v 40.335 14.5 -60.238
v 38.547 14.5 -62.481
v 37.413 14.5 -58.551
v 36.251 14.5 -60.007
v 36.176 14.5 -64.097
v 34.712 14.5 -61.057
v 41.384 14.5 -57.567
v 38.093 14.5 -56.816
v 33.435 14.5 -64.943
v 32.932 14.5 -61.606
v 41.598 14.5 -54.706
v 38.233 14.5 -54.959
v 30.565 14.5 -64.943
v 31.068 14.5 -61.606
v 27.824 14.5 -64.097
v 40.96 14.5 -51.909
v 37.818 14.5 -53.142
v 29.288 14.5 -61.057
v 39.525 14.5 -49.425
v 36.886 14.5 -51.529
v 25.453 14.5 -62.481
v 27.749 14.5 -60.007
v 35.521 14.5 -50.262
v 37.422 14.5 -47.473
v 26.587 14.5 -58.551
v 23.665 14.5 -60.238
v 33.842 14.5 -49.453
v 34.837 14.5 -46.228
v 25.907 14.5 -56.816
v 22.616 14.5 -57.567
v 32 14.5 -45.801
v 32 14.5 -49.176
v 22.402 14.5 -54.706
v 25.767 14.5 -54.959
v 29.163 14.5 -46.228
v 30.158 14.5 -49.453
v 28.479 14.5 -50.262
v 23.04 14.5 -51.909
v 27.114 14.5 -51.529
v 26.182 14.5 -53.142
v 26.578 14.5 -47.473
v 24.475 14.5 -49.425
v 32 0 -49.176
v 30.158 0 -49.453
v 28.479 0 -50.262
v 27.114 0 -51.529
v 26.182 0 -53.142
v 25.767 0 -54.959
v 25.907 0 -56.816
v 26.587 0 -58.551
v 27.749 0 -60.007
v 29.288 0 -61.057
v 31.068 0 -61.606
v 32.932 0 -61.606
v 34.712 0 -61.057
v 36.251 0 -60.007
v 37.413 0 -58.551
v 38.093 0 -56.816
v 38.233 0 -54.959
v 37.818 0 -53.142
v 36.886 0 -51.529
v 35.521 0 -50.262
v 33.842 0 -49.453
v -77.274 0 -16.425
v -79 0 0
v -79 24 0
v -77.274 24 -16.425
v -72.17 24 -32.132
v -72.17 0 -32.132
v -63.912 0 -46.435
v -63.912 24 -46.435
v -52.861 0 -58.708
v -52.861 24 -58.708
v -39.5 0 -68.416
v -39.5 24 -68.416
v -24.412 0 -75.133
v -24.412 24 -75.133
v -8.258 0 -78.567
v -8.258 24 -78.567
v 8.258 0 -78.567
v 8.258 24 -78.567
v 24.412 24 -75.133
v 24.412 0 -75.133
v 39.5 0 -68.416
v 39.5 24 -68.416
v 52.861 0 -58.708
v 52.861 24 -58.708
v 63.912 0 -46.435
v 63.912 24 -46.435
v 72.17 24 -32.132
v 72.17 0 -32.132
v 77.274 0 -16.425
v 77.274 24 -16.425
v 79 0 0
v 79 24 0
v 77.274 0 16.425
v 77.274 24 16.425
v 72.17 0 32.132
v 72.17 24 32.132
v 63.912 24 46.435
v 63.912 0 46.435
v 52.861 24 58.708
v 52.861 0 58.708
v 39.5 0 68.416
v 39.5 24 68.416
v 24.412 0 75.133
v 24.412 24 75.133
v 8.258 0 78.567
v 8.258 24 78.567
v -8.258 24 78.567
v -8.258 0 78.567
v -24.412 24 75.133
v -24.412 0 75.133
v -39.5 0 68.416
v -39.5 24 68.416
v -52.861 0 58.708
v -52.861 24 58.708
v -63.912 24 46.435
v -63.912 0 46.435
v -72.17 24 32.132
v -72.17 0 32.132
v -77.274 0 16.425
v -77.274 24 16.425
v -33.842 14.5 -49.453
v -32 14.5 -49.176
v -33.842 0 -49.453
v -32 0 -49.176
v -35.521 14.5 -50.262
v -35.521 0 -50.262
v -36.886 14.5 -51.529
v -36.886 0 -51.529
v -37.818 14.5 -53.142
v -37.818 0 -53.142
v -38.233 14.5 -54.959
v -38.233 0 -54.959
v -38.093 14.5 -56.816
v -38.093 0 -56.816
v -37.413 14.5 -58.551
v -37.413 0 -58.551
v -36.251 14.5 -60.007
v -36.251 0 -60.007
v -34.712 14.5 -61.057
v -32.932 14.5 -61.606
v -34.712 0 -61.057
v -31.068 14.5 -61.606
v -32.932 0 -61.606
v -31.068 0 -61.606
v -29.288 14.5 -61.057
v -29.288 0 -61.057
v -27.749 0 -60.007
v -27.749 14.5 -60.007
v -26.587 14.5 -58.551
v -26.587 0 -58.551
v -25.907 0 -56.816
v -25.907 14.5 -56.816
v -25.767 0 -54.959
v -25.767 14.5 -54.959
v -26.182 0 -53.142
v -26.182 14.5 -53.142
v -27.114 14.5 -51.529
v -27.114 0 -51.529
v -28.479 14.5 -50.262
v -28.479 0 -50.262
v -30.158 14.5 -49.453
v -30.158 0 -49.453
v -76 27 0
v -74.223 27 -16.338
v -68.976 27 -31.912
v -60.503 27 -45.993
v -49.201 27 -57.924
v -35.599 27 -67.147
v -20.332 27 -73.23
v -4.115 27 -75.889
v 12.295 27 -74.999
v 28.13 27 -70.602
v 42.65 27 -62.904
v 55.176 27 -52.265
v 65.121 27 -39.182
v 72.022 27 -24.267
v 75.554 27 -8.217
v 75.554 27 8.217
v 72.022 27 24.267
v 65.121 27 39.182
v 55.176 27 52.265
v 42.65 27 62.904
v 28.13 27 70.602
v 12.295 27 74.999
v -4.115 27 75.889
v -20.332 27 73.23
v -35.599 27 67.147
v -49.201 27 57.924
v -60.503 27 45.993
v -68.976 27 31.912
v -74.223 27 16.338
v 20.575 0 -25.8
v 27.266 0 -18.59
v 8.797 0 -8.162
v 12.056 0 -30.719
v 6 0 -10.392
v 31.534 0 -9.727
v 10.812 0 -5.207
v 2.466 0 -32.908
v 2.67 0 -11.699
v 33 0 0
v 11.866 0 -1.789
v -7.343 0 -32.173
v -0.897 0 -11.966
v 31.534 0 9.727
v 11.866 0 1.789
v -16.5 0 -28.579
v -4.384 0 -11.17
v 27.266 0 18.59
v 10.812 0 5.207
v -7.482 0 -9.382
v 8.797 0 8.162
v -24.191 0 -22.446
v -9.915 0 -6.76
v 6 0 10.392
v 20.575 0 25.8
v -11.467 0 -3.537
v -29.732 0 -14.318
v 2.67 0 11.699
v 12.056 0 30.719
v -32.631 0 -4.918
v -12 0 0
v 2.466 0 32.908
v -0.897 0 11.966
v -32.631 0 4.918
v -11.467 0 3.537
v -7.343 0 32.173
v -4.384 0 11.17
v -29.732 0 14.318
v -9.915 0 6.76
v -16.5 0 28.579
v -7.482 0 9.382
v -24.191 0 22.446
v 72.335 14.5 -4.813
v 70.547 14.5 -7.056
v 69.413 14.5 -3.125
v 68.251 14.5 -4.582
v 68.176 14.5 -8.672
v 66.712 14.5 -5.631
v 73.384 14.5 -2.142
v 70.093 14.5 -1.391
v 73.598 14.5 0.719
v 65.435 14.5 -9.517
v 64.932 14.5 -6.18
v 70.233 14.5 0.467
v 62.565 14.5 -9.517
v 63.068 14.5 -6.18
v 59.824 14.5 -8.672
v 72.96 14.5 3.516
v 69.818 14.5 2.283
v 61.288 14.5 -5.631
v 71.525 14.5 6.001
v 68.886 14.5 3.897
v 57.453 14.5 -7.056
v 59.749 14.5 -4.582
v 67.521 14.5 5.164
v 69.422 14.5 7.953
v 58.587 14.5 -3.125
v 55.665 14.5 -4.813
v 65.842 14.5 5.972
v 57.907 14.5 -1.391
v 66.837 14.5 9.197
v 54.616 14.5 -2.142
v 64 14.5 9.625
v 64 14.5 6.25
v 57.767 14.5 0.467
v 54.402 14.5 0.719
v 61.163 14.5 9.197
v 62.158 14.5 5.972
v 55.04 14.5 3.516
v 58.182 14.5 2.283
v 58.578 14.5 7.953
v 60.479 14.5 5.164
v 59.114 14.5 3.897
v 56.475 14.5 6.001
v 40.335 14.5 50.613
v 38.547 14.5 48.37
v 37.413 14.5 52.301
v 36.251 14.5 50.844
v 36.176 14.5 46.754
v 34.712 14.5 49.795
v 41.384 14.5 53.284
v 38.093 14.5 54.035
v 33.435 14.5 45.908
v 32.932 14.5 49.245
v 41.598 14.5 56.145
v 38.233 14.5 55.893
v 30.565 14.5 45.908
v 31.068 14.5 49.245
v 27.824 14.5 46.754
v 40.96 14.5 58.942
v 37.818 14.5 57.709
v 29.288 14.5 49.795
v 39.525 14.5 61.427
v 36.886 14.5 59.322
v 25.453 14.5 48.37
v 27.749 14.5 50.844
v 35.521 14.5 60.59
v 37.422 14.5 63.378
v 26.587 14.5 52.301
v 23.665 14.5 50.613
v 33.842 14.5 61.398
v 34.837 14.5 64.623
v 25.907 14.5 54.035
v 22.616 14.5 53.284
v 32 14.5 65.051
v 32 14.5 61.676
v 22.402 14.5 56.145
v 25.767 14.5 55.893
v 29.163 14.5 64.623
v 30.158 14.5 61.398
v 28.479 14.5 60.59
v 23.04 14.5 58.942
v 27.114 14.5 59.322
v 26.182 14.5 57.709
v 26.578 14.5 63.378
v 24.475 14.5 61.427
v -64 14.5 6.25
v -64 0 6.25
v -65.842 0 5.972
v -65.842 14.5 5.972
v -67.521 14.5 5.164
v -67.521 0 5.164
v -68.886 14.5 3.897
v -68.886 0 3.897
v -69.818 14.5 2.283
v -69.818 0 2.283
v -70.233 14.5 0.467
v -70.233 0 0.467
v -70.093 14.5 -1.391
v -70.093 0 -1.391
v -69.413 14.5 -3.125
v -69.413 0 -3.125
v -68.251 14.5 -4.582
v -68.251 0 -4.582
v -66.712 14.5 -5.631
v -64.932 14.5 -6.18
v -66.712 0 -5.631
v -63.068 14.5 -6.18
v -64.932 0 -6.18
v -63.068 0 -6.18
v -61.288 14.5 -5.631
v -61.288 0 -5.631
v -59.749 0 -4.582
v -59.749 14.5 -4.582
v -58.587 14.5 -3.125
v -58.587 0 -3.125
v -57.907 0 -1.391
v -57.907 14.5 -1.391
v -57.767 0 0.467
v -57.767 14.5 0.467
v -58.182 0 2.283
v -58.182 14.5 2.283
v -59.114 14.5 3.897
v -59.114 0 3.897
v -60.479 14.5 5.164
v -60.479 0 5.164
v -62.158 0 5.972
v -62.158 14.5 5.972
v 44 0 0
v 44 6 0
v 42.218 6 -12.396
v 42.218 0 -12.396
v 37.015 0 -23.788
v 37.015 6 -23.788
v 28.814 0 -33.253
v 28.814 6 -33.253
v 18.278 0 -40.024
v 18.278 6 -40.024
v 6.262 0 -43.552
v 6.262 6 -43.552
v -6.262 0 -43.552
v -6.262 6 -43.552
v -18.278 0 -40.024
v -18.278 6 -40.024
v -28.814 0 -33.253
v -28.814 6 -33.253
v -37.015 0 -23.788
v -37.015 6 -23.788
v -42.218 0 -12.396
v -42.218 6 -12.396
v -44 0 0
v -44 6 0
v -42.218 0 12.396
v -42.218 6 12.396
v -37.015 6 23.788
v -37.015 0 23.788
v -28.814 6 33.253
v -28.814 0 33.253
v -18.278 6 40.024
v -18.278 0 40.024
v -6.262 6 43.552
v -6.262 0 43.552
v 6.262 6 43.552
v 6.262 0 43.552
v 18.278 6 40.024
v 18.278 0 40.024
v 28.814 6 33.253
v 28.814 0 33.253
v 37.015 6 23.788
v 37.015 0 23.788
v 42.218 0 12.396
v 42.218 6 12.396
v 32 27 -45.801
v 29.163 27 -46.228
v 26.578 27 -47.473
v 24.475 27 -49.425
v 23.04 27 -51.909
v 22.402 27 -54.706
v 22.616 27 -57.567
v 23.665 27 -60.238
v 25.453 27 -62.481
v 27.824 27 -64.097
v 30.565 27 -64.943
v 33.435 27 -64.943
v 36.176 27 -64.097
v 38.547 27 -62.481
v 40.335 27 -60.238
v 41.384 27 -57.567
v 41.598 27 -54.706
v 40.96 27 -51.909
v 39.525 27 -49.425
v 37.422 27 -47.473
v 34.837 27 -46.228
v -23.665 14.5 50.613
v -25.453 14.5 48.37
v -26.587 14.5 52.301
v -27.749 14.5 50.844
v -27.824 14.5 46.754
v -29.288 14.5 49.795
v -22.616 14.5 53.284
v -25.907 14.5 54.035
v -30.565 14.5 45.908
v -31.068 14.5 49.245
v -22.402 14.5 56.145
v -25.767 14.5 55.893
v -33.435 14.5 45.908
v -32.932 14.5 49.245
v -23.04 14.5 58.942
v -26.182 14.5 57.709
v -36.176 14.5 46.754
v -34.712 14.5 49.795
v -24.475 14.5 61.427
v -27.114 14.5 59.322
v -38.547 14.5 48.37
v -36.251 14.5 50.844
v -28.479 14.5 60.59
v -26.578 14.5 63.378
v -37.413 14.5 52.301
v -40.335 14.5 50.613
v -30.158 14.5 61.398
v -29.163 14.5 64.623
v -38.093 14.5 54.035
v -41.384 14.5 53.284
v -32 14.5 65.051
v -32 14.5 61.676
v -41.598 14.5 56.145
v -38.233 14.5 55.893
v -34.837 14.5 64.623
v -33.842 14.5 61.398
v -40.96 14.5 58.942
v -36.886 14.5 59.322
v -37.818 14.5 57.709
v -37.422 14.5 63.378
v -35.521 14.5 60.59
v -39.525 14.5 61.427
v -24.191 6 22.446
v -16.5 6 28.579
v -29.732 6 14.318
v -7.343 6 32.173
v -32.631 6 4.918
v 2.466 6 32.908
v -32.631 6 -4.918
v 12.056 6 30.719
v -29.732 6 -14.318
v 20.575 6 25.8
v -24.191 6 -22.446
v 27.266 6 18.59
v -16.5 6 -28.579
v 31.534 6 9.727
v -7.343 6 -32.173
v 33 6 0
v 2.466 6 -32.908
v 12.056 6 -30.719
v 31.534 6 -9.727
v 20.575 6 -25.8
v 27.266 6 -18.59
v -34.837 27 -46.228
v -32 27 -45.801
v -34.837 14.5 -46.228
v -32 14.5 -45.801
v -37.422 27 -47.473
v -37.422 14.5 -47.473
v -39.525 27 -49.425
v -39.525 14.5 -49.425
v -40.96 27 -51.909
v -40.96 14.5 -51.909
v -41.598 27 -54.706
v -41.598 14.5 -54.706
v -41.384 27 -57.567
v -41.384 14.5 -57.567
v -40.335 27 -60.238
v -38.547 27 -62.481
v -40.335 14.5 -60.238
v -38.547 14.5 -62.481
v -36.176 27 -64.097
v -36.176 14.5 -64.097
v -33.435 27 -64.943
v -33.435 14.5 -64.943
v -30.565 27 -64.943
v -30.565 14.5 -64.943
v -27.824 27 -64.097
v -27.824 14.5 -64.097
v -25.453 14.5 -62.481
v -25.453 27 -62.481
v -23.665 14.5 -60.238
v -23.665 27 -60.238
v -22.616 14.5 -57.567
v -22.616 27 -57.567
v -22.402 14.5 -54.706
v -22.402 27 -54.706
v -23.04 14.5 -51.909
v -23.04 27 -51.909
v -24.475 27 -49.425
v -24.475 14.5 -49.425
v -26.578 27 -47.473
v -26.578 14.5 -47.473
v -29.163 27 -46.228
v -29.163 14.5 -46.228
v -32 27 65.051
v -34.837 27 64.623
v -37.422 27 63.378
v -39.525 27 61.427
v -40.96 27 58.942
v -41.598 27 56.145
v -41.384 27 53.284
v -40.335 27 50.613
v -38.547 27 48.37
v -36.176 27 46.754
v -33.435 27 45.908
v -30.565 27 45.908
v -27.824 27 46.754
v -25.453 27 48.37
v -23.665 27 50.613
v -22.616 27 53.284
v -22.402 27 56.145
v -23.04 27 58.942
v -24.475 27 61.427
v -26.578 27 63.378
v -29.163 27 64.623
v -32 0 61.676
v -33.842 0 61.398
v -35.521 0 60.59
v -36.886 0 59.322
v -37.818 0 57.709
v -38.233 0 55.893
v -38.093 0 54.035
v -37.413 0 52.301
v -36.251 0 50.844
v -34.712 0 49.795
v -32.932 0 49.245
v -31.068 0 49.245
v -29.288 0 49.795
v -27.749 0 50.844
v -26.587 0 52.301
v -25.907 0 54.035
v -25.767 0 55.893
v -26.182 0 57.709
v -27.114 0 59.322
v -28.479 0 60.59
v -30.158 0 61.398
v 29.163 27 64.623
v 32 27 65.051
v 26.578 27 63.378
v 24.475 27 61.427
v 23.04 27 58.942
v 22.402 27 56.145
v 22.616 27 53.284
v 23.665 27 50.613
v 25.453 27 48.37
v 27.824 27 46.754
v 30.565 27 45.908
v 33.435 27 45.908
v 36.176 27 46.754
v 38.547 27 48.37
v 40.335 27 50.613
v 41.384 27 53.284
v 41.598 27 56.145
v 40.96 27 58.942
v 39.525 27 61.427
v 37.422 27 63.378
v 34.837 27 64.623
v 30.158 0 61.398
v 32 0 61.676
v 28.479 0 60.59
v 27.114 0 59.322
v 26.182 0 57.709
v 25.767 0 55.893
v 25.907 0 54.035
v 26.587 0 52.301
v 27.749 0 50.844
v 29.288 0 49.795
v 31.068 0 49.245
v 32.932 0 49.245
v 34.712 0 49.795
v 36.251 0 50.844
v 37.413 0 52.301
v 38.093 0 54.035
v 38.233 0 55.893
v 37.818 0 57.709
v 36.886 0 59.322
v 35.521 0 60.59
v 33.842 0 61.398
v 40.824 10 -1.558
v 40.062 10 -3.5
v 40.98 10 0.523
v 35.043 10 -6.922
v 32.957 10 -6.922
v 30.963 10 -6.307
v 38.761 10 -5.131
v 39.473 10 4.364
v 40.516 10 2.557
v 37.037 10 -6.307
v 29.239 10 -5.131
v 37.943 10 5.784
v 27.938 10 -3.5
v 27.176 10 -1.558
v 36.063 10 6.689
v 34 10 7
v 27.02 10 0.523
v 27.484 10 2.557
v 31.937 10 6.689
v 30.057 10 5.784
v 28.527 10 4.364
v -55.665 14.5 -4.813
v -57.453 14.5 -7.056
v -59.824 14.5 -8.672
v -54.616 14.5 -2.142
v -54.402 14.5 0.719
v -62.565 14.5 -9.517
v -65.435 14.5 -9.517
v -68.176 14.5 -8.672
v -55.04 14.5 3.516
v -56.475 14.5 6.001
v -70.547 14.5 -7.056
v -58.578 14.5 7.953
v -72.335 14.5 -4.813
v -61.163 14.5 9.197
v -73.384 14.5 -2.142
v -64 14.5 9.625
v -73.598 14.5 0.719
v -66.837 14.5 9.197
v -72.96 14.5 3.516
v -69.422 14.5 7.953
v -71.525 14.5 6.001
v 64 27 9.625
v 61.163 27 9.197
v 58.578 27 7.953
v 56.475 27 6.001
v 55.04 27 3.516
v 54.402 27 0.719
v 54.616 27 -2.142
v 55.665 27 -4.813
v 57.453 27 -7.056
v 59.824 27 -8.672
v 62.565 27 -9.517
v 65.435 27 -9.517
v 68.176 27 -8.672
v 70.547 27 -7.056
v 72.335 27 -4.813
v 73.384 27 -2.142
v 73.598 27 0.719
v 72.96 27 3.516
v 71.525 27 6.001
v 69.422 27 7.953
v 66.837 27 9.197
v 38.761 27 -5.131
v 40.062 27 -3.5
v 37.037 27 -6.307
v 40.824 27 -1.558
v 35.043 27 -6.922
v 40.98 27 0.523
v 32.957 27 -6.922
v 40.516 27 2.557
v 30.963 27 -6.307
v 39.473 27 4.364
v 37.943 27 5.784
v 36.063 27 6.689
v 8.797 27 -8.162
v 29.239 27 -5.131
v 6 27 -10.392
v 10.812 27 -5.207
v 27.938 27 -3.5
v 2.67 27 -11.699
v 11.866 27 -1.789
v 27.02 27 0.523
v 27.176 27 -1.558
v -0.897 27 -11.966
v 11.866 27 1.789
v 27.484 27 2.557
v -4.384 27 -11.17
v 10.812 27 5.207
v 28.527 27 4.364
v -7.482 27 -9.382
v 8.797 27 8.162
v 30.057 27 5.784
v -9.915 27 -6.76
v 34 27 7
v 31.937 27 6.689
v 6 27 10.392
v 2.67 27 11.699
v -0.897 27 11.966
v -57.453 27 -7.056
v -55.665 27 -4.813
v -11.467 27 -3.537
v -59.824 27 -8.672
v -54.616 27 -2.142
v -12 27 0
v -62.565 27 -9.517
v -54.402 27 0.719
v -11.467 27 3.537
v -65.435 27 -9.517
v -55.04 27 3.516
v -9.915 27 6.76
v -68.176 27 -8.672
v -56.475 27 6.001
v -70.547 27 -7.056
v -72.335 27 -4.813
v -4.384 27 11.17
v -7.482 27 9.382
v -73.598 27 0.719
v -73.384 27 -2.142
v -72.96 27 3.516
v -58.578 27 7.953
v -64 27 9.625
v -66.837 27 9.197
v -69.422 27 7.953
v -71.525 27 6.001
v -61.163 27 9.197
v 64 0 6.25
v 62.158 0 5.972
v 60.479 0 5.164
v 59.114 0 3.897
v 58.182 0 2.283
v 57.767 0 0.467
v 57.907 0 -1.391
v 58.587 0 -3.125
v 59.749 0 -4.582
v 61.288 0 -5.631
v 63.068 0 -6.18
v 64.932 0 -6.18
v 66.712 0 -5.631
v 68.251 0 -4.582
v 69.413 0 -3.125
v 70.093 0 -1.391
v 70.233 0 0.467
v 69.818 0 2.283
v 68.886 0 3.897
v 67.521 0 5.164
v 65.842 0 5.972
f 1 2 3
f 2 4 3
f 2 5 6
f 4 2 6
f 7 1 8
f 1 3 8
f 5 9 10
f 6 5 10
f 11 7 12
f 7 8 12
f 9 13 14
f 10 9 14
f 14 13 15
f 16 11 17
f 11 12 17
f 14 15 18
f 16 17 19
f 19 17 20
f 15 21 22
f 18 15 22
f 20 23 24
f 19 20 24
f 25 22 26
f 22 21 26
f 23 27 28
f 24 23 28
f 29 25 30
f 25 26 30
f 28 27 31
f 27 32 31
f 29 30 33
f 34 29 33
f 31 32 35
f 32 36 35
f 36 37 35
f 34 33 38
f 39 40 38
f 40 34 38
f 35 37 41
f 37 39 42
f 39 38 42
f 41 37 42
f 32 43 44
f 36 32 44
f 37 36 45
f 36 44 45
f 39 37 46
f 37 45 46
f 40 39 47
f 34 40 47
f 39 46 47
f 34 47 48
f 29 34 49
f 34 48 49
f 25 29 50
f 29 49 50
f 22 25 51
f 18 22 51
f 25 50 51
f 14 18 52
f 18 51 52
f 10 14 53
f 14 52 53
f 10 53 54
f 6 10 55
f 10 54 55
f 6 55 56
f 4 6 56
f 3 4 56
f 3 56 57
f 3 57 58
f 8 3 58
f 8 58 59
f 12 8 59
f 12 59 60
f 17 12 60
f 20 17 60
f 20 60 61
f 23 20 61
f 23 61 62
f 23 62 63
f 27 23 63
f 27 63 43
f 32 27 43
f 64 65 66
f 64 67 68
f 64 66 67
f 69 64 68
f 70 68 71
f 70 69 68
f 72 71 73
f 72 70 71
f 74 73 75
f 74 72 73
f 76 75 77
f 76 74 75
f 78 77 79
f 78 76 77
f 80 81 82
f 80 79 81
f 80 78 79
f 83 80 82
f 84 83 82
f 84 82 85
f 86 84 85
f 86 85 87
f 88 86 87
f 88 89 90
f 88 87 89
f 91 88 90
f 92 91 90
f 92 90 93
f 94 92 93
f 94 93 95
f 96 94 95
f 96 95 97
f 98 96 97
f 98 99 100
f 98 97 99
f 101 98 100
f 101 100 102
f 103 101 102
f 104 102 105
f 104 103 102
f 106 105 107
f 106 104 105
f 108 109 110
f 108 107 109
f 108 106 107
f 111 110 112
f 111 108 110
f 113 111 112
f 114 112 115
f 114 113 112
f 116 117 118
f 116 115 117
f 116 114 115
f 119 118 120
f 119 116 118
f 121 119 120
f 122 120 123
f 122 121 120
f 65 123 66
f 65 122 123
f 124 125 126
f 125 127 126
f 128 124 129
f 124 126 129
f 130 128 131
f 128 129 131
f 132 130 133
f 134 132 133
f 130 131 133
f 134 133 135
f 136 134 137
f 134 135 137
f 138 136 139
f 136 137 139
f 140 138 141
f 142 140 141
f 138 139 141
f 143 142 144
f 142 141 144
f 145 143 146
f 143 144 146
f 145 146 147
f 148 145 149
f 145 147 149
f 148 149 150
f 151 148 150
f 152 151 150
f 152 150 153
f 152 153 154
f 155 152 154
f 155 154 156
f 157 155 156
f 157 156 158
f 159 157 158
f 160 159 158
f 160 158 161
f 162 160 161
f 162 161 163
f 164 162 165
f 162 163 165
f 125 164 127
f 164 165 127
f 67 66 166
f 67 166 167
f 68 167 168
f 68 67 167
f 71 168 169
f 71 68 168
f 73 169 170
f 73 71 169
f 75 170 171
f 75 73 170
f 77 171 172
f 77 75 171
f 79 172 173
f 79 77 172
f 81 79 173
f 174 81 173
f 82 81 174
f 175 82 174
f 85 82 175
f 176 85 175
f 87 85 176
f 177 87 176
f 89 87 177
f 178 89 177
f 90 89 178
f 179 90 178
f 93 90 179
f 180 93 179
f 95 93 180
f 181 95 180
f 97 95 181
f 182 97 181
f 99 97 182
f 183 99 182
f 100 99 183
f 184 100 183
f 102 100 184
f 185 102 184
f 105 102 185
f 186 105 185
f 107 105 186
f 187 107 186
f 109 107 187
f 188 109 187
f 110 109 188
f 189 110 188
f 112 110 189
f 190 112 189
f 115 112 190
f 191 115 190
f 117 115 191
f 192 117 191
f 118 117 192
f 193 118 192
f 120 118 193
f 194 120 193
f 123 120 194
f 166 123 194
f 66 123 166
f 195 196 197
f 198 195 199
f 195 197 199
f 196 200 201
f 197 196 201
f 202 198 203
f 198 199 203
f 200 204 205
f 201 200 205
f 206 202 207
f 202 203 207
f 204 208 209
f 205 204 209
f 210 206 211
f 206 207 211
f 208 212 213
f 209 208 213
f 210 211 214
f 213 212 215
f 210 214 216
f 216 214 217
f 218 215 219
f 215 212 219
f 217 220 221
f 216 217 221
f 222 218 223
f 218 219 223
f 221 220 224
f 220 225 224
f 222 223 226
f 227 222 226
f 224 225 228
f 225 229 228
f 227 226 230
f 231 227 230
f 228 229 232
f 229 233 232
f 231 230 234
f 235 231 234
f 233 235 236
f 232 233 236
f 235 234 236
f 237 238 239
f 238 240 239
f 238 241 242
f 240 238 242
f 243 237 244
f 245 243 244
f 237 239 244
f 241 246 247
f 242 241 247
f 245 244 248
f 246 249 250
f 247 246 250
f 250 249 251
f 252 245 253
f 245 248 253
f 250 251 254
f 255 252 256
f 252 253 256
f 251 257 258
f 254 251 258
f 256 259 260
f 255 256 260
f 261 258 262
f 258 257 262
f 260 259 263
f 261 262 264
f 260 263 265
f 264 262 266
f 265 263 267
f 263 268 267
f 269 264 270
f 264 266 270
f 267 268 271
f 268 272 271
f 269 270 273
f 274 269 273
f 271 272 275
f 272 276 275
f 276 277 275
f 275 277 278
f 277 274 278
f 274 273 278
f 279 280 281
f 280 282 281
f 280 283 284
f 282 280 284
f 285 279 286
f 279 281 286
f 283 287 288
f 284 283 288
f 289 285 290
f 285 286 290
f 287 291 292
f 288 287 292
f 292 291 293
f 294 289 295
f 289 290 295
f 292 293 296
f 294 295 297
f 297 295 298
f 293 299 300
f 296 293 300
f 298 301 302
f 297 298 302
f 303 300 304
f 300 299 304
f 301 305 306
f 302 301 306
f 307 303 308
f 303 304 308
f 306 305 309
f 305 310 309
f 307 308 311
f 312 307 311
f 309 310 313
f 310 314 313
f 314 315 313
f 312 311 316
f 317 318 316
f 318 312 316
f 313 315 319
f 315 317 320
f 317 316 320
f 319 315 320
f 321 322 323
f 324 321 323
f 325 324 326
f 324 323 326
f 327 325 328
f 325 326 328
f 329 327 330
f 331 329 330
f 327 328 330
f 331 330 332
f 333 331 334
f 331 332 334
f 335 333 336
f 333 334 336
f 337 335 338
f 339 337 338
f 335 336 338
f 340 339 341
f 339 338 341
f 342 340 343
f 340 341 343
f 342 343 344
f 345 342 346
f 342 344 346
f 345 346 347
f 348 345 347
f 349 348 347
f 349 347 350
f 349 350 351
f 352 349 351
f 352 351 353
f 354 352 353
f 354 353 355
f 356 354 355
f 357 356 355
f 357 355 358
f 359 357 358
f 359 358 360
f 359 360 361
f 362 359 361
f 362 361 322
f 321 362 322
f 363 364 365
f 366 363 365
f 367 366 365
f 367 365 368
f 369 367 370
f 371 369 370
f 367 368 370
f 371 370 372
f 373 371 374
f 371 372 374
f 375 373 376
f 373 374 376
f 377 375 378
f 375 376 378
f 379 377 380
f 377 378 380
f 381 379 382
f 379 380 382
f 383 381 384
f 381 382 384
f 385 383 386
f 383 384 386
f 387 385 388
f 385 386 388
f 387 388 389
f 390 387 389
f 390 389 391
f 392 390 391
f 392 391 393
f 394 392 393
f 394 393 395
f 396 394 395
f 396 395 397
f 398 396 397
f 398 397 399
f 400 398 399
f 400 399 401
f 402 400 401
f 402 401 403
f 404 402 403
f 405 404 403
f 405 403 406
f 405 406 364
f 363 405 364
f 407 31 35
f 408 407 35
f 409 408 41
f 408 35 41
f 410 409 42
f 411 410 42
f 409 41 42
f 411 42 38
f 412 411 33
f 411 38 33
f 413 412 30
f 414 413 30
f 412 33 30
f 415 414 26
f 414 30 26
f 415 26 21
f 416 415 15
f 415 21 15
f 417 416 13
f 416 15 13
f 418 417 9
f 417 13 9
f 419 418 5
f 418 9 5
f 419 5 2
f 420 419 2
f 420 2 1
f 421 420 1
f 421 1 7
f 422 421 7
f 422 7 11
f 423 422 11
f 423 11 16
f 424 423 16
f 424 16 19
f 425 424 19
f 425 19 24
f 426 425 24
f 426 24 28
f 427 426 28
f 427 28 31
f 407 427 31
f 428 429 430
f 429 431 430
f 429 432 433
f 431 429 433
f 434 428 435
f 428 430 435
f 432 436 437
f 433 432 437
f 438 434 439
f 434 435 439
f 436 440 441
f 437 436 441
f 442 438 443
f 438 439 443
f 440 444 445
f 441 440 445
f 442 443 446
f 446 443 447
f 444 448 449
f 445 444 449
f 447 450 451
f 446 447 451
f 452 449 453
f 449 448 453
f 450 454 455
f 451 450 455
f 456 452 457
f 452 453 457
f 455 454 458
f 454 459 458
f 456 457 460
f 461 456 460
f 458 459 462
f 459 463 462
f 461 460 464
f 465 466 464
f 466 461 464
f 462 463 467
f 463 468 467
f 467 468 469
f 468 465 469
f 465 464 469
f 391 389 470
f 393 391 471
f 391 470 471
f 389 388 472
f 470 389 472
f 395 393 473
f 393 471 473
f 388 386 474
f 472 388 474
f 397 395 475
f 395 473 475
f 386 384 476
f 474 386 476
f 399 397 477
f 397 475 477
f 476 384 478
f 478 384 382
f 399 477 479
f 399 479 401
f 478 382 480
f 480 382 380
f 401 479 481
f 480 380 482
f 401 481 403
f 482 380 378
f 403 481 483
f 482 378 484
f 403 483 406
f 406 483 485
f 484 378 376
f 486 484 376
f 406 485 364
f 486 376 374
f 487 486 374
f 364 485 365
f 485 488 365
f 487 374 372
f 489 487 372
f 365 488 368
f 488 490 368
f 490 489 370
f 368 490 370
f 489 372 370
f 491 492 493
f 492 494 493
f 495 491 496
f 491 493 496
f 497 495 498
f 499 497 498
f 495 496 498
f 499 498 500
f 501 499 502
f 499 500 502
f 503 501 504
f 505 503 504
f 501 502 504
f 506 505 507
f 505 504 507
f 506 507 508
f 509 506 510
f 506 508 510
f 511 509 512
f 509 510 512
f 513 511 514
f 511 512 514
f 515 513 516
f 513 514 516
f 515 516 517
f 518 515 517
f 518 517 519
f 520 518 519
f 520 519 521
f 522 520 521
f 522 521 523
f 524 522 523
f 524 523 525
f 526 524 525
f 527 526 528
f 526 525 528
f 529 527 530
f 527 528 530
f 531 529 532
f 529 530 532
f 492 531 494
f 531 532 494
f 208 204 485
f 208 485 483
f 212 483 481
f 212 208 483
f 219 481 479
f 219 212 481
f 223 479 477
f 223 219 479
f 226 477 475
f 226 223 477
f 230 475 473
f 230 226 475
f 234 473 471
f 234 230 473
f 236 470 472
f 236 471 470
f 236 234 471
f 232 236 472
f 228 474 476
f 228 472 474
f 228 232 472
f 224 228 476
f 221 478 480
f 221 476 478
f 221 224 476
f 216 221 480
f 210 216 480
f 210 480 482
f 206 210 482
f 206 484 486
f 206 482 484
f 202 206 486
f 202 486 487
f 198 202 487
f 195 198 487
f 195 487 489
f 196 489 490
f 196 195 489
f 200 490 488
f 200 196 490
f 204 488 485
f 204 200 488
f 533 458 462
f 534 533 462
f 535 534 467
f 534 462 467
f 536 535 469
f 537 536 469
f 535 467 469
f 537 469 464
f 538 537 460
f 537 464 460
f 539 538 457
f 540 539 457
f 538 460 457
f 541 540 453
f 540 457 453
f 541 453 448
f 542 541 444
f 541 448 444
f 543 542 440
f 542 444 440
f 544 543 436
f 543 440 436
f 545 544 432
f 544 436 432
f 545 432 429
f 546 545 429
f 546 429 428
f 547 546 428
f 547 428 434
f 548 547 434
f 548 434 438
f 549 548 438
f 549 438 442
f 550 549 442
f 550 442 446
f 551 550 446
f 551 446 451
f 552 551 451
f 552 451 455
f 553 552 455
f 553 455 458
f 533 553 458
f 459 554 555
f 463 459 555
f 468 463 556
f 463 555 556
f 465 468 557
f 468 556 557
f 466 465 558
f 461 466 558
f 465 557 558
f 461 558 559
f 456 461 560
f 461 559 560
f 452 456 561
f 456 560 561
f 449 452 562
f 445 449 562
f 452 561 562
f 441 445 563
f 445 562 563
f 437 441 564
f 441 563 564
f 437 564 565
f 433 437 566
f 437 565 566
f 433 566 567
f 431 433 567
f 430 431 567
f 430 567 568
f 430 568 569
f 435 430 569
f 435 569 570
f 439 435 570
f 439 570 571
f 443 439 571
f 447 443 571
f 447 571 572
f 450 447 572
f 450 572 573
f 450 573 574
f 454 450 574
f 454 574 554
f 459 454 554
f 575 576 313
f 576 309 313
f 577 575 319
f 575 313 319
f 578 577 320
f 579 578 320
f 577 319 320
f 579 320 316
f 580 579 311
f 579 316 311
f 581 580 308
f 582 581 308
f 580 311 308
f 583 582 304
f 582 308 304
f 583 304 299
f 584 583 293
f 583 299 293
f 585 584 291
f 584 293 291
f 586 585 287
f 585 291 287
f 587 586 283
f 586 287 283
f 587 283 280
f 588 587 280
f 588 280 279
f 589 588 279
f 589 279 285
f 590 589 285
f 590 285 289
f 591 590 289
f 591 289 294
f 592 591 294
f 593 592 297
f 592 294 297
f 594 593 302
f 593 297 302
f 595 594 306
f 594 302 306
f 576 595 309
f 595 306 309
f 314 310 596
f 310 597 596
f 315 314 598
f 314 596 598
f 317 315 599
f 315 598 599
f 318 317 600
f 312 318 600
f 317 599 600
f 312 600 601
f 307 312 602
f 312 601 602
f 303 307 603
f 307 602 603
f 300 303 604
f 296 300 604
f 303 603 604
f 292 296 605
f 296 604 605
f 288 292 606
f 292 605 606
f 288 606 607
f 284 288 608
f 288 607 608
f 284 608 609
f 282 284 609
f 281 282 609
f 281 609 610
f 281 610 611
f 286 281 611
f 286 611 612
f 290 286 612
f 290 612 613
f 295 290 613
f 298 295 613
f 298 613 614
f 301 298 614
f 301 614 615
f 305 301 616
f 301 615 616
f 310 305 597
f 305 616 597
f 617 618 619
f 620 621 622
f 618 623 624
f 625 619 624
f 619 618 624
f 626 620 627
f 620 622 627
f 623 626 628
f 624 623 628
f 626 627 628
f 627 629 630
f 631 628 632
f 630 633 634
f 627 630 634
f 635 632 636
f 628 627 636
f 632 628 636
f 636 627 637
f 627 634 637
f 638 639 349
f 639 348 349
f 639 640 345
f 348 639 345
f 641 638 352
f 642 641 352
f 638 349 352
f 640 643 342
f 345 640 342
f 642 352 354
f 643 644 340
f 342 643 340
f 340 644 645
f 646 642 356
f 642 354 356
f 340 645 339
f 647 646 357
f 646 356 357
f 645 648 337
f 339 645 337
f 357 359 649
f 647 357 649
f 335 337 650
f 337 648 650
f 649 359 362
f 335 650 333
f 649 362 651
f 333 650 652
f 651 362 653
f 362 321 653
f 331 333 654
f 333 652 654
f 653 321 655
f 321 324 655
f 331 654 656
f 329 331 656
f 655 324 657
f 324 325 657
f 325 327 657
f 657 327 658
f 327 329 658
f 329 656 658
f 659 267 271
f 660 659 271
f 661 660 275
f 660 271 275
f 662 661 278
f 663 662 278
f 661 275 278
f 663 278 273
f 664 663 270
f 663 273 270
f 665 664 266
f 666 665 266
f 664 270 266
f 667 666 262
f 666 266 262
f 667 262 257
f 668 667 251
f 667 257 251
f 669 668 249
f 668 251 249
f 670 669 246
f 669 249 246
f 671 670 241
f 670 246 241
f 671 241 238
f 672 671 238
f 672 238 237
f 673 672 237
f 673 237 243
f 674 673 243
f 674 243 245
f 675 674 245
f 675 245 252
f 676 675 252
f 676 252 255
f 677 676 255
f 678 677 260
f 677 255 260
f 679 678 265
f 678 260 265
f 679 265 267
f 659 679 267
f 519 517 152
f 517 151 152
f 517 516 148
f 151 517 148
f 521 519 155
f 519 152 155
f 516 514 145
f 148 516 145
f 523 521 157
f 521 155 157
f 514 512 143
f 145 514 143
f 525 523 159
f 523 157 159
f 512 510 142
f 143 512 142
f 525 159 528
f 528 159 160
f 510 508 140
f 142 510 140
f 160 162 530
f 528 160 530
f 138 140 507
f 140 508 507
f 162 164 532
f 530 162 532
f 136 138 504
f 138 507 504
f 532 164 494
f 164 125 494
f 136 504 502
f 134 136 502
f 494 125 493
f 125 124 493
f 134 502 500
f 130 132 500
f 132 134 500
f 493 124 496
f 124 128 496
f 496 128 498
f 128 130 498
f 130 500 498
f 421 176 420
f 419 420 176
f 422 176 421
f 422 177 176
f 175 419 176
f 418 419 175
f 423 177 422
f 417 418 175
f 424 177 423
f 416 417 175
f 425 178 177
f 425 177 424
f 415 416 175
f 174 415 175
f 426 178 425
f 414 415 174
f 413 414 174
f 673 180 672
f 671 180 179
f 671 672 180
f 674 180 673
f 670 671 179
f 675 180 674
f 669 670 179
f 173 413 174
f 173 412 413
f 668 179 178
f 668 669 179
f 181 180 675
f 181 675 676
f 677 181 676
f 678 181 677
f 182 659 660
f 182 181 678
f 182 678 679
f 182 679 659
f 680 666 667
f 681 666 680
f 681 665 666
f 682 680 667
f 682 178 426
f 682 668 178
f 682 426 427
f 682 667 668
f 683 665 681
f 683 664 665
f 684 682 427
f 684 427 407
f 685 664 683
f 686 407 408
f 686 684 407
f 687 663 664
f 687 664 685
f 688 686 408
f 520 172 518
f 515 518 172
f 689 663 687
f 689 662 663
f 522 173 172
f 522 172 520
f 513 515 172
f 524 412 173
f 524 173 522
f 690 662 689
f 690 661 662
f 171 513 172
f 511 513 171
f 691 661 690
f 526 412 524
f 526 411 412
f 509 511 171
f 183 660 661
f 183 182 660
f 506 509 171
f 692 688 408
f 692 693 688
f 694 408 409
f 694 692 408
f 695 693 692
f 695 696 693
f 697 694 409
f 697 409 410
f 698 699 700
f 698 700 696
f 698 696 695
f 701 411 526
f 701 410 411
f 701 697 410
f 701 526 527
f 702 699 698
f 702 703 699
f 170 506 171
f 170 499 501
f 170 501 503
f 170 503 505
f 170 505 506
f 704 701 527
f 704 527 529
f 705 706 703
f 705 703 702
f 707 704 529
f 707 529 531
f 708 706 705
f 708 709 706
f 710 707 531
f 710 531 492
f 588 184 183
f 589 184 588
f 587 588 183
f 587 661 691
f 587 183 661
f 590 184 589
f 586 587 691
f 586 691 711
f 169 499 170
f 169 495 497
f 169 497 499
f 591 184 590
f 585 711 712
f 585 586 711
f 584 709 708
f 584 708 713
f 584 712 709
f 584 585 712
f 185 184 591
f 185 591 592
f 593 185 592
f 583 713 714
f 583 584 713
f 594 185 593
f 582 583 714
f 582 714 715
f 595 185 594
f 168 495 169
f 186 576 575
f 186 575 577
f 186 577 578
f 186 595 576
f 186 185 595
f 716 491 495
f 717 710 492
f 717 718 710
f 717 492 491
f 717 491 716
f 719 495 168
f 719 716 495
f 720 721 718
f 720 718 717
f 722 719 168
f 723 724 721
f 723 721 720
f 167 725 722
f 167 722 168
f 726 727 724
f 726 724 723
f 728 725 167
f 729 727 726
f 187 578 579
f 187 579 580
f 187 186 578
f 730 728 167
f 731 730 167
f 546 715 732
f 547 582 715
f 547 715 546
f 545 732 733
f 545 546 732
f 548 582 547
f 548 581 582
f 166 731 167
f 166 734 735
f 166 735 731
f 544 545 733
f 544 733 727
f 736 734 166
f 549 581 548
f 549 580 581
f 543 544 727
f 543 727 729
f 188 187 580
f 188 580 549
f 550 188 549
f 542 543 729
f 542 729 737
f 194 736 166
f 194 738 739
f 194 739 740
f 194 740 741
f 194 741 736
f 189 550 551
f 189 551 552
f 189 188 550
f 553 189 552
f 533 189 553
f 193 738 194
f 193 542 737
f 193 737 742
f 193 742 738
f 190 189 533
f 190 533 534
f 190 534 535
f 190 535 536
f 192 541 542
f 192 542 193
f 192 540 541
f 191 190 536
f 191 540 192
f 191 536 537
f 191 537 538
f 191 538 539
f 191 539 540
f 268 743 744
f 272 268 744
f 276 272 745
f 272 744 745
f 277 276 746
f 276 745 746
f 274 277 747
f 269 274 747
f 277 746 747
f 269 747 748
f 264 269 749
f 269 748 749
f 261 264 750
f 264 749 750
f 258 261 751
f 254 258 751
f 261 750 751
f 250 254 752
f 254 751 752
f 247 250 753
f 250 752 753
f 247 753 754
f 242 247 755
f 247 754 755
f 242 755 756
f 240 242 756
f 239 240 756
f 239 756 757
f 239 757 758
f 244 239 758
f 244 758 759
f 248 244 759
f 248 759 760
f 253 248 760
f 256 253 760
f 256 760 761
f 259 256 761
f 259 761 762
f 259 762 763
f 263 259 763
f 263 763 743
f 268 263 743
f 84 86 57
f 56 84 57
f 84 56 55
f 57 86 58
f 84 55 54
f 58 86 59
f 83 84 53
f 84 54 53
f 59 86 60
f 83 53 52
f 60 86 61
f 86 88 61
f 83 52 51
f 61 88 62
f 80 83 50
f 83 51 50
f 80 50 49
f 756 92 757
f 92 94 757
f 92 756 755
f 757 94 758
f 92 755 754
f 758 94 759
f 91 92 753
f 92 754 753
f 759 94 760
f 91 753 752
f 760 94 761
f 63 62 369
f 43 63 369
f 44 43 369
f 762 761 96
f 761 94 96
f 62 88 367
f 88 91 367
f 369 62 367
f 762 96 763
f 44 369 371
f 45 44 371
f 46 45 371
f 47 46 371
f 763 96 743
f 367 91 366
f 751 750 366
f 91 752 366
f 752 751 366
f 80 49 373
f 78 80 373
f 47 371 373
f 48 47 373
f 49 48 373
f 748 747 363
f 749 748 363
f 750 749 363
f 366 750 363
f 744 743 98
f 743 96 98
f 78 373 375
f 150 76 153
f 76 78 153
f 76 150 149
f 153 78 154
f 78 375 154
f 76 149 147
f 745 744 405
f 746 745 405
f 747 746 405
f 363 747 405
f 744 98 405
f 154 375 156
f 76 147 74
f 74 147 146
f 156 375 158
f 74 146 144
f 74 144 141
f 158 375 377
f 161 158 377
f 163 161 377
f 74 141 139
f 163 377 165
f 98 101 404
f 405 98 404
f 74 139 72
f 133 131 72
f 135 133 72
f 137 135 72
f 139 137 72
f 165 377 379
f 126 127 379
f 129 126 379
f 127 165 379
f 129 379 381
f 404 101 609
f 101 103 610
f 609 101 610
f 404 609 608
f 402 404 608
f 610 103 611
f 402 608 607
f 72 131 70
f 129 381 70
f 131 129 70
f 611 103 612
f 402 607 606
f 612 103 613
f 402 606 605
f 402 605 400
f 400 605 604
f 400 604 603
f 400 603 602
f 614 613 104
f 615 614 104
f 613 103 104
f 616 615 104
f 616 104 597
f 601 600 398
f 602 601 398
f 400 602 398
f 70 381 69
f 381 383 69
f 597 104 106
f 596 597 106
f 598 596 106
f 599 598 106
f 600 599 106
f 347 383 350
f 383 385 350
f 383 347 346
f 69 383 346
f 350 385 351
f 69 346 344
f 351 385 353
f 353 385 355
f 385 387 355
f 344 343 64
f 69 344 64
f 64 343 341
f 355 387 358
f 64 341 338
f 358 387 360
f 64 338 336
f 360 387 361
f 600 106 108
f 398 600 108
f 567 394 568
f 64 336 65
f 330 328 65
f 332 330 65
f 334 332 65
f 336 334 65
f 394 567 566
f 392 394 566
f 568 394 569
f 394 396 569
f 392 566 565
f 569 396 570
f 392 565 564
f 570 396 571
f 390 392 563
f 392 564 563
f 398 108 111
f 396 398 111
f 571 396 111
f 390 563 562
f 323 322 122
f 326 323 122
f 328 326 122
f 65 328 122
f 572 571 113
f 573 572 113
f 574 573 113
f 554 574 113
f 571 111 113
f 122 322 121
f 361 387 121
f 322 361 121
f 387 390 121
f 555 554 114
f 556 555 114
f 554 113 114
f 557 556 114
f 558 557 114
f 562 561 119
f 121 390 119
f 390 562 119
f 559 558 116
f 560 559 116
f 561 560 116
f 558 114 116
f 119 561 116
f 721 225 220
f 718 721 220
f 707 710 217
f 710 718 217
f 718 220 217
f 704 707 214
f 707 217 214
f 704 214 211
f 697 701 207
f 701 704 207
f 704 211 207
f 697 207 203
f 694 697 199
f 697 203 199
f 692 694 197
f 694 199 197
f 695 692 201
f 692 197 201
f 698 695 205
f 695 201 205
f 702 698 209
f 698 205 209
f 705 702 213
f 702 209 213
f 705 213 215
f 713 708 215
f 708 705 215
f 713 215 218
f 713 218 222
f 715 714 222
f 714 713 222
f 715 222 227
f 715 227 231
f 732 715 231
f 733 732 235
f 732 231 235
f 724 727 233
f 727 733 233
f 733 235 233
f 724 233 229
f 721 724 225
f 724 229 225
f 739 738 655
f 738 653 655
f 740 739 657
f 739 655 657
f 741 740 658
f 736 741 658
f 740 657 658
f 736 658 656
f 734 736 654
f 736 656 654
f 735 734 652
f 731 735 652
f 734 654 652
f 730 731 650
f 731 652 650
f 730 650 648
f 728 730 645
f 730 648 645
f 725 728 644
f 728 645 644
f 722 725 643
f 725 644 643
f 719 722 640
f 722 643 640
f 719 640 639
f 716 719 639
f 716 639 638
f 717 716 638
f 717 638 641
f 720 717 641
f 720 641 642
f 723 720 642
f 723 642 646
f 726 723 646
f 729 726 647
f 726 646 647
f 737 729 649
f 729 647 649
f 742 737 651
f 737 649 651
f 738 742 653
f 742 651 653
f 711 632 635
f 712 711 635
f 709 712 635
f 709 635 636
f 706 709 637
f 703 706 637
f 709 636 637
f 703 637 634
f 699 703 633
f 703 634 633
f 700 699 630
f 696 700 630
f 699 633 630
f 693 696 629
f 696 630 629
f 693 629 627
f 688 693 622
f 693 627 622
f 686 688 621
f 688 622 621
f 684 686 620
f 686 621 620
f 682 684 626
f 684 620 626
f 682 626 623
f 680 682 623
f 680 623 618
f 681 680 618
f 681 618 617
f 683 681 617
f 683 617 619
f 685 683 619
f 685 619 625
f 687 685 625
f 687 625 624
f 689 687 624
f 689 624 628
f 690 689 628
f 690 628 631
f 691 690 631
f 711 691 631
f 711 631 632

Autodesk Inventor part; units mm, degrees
ref_plane "YZ Plane" through (0, 0, 0) normal (1, 0, 0) x (0, 1, 0)
ref_plane "XZ Plane" through (0, 0, 0) normal (0, 1, 0) x (-1, 0, 0)
ref_plane "XY Plane" through (0, 0, 0) normal (0, 0, 1) x (1, 0, 0)
sketch "Boceto1" plane through (0, 0, 0) normal (0, 1, 0) x (-1, 0, 0)
  circle A0 centre (0, 0) radius 79
  circle A1 centre (0, 0) radius 12
  dimension "d0" = 158
  dimension "d1" = 24
extrude "Extrusión1" add sketch "Boceto1" along normal blind 27
chamfer "Chaflán1" distance 3 angle 45 1 edges at (79, 27, 0) measured on face at (-12.739, 27, -55.0245)
sketch "Boceto2" plane through (0, 27, 0) normal (0, 1, 0) x (1, 0, 0)
  circle A0 centre (0, 0) radius 64 construction
  line L0 (0, 0) -> (64, 0) construction
  point P0 (32, 55.4256)
  point P1 (-32, 55.4256)
  point P2 (-64, 0)
  point P3 (-32, -55.4256)
  point P4 (32, -55.4256)
  dimension "d7" = 128
  dimension "d10" = 360
hole "Agujero1" at (64, 27, 0) at (32, 27, -55.4256) at (-32, 27, -55.4256) at (-64, 27, 0) at (-32, 27, 55.4256) at (32, 27, 55.4256) direction (0, -1, 0) diameter 12.5 end through all counterbore diameter 19.25 counterbore depth 12.5
sketch "Boceto3" plane through (0, 27, 0) normal (0, 1, 0) x (1, 0, 0)
  line L0 (0, 0) -> (34, 0) construction
  dimension "d19" = 34
hole "Agujero2" at (34, 27, 0) direction (0, -1, 0) diameter 14 depth 17
sketch "Boceto5" plane through (0, 0, 0) normal (0, 0, 1) x (1, 0, 0)
  line L0 (79, 0) -> (-79, 0) construction
  line L1 (79, 0) -> (33, 0) construction
  line L2 (33, 0) -> (44, 0)
  line L3 (44, 0) -> (44, 6)
  line L4 (44, 6) -> (33, 6)
  line L5 (33, 6) -> (33, 0)
  line L6 (0, 0) -> (0, 42.6021) construction
  dimension "d29" = 46
  dimension "d30" = 11
  dimension "d31" = 6
  dimension "d32" = 11
revolve "Revolución1" cut sketch "Boceto5" angle 360 about axis through (0, 0, 0) along (0, 1, 0)
properties part number "2_VálvulaSuperior"
